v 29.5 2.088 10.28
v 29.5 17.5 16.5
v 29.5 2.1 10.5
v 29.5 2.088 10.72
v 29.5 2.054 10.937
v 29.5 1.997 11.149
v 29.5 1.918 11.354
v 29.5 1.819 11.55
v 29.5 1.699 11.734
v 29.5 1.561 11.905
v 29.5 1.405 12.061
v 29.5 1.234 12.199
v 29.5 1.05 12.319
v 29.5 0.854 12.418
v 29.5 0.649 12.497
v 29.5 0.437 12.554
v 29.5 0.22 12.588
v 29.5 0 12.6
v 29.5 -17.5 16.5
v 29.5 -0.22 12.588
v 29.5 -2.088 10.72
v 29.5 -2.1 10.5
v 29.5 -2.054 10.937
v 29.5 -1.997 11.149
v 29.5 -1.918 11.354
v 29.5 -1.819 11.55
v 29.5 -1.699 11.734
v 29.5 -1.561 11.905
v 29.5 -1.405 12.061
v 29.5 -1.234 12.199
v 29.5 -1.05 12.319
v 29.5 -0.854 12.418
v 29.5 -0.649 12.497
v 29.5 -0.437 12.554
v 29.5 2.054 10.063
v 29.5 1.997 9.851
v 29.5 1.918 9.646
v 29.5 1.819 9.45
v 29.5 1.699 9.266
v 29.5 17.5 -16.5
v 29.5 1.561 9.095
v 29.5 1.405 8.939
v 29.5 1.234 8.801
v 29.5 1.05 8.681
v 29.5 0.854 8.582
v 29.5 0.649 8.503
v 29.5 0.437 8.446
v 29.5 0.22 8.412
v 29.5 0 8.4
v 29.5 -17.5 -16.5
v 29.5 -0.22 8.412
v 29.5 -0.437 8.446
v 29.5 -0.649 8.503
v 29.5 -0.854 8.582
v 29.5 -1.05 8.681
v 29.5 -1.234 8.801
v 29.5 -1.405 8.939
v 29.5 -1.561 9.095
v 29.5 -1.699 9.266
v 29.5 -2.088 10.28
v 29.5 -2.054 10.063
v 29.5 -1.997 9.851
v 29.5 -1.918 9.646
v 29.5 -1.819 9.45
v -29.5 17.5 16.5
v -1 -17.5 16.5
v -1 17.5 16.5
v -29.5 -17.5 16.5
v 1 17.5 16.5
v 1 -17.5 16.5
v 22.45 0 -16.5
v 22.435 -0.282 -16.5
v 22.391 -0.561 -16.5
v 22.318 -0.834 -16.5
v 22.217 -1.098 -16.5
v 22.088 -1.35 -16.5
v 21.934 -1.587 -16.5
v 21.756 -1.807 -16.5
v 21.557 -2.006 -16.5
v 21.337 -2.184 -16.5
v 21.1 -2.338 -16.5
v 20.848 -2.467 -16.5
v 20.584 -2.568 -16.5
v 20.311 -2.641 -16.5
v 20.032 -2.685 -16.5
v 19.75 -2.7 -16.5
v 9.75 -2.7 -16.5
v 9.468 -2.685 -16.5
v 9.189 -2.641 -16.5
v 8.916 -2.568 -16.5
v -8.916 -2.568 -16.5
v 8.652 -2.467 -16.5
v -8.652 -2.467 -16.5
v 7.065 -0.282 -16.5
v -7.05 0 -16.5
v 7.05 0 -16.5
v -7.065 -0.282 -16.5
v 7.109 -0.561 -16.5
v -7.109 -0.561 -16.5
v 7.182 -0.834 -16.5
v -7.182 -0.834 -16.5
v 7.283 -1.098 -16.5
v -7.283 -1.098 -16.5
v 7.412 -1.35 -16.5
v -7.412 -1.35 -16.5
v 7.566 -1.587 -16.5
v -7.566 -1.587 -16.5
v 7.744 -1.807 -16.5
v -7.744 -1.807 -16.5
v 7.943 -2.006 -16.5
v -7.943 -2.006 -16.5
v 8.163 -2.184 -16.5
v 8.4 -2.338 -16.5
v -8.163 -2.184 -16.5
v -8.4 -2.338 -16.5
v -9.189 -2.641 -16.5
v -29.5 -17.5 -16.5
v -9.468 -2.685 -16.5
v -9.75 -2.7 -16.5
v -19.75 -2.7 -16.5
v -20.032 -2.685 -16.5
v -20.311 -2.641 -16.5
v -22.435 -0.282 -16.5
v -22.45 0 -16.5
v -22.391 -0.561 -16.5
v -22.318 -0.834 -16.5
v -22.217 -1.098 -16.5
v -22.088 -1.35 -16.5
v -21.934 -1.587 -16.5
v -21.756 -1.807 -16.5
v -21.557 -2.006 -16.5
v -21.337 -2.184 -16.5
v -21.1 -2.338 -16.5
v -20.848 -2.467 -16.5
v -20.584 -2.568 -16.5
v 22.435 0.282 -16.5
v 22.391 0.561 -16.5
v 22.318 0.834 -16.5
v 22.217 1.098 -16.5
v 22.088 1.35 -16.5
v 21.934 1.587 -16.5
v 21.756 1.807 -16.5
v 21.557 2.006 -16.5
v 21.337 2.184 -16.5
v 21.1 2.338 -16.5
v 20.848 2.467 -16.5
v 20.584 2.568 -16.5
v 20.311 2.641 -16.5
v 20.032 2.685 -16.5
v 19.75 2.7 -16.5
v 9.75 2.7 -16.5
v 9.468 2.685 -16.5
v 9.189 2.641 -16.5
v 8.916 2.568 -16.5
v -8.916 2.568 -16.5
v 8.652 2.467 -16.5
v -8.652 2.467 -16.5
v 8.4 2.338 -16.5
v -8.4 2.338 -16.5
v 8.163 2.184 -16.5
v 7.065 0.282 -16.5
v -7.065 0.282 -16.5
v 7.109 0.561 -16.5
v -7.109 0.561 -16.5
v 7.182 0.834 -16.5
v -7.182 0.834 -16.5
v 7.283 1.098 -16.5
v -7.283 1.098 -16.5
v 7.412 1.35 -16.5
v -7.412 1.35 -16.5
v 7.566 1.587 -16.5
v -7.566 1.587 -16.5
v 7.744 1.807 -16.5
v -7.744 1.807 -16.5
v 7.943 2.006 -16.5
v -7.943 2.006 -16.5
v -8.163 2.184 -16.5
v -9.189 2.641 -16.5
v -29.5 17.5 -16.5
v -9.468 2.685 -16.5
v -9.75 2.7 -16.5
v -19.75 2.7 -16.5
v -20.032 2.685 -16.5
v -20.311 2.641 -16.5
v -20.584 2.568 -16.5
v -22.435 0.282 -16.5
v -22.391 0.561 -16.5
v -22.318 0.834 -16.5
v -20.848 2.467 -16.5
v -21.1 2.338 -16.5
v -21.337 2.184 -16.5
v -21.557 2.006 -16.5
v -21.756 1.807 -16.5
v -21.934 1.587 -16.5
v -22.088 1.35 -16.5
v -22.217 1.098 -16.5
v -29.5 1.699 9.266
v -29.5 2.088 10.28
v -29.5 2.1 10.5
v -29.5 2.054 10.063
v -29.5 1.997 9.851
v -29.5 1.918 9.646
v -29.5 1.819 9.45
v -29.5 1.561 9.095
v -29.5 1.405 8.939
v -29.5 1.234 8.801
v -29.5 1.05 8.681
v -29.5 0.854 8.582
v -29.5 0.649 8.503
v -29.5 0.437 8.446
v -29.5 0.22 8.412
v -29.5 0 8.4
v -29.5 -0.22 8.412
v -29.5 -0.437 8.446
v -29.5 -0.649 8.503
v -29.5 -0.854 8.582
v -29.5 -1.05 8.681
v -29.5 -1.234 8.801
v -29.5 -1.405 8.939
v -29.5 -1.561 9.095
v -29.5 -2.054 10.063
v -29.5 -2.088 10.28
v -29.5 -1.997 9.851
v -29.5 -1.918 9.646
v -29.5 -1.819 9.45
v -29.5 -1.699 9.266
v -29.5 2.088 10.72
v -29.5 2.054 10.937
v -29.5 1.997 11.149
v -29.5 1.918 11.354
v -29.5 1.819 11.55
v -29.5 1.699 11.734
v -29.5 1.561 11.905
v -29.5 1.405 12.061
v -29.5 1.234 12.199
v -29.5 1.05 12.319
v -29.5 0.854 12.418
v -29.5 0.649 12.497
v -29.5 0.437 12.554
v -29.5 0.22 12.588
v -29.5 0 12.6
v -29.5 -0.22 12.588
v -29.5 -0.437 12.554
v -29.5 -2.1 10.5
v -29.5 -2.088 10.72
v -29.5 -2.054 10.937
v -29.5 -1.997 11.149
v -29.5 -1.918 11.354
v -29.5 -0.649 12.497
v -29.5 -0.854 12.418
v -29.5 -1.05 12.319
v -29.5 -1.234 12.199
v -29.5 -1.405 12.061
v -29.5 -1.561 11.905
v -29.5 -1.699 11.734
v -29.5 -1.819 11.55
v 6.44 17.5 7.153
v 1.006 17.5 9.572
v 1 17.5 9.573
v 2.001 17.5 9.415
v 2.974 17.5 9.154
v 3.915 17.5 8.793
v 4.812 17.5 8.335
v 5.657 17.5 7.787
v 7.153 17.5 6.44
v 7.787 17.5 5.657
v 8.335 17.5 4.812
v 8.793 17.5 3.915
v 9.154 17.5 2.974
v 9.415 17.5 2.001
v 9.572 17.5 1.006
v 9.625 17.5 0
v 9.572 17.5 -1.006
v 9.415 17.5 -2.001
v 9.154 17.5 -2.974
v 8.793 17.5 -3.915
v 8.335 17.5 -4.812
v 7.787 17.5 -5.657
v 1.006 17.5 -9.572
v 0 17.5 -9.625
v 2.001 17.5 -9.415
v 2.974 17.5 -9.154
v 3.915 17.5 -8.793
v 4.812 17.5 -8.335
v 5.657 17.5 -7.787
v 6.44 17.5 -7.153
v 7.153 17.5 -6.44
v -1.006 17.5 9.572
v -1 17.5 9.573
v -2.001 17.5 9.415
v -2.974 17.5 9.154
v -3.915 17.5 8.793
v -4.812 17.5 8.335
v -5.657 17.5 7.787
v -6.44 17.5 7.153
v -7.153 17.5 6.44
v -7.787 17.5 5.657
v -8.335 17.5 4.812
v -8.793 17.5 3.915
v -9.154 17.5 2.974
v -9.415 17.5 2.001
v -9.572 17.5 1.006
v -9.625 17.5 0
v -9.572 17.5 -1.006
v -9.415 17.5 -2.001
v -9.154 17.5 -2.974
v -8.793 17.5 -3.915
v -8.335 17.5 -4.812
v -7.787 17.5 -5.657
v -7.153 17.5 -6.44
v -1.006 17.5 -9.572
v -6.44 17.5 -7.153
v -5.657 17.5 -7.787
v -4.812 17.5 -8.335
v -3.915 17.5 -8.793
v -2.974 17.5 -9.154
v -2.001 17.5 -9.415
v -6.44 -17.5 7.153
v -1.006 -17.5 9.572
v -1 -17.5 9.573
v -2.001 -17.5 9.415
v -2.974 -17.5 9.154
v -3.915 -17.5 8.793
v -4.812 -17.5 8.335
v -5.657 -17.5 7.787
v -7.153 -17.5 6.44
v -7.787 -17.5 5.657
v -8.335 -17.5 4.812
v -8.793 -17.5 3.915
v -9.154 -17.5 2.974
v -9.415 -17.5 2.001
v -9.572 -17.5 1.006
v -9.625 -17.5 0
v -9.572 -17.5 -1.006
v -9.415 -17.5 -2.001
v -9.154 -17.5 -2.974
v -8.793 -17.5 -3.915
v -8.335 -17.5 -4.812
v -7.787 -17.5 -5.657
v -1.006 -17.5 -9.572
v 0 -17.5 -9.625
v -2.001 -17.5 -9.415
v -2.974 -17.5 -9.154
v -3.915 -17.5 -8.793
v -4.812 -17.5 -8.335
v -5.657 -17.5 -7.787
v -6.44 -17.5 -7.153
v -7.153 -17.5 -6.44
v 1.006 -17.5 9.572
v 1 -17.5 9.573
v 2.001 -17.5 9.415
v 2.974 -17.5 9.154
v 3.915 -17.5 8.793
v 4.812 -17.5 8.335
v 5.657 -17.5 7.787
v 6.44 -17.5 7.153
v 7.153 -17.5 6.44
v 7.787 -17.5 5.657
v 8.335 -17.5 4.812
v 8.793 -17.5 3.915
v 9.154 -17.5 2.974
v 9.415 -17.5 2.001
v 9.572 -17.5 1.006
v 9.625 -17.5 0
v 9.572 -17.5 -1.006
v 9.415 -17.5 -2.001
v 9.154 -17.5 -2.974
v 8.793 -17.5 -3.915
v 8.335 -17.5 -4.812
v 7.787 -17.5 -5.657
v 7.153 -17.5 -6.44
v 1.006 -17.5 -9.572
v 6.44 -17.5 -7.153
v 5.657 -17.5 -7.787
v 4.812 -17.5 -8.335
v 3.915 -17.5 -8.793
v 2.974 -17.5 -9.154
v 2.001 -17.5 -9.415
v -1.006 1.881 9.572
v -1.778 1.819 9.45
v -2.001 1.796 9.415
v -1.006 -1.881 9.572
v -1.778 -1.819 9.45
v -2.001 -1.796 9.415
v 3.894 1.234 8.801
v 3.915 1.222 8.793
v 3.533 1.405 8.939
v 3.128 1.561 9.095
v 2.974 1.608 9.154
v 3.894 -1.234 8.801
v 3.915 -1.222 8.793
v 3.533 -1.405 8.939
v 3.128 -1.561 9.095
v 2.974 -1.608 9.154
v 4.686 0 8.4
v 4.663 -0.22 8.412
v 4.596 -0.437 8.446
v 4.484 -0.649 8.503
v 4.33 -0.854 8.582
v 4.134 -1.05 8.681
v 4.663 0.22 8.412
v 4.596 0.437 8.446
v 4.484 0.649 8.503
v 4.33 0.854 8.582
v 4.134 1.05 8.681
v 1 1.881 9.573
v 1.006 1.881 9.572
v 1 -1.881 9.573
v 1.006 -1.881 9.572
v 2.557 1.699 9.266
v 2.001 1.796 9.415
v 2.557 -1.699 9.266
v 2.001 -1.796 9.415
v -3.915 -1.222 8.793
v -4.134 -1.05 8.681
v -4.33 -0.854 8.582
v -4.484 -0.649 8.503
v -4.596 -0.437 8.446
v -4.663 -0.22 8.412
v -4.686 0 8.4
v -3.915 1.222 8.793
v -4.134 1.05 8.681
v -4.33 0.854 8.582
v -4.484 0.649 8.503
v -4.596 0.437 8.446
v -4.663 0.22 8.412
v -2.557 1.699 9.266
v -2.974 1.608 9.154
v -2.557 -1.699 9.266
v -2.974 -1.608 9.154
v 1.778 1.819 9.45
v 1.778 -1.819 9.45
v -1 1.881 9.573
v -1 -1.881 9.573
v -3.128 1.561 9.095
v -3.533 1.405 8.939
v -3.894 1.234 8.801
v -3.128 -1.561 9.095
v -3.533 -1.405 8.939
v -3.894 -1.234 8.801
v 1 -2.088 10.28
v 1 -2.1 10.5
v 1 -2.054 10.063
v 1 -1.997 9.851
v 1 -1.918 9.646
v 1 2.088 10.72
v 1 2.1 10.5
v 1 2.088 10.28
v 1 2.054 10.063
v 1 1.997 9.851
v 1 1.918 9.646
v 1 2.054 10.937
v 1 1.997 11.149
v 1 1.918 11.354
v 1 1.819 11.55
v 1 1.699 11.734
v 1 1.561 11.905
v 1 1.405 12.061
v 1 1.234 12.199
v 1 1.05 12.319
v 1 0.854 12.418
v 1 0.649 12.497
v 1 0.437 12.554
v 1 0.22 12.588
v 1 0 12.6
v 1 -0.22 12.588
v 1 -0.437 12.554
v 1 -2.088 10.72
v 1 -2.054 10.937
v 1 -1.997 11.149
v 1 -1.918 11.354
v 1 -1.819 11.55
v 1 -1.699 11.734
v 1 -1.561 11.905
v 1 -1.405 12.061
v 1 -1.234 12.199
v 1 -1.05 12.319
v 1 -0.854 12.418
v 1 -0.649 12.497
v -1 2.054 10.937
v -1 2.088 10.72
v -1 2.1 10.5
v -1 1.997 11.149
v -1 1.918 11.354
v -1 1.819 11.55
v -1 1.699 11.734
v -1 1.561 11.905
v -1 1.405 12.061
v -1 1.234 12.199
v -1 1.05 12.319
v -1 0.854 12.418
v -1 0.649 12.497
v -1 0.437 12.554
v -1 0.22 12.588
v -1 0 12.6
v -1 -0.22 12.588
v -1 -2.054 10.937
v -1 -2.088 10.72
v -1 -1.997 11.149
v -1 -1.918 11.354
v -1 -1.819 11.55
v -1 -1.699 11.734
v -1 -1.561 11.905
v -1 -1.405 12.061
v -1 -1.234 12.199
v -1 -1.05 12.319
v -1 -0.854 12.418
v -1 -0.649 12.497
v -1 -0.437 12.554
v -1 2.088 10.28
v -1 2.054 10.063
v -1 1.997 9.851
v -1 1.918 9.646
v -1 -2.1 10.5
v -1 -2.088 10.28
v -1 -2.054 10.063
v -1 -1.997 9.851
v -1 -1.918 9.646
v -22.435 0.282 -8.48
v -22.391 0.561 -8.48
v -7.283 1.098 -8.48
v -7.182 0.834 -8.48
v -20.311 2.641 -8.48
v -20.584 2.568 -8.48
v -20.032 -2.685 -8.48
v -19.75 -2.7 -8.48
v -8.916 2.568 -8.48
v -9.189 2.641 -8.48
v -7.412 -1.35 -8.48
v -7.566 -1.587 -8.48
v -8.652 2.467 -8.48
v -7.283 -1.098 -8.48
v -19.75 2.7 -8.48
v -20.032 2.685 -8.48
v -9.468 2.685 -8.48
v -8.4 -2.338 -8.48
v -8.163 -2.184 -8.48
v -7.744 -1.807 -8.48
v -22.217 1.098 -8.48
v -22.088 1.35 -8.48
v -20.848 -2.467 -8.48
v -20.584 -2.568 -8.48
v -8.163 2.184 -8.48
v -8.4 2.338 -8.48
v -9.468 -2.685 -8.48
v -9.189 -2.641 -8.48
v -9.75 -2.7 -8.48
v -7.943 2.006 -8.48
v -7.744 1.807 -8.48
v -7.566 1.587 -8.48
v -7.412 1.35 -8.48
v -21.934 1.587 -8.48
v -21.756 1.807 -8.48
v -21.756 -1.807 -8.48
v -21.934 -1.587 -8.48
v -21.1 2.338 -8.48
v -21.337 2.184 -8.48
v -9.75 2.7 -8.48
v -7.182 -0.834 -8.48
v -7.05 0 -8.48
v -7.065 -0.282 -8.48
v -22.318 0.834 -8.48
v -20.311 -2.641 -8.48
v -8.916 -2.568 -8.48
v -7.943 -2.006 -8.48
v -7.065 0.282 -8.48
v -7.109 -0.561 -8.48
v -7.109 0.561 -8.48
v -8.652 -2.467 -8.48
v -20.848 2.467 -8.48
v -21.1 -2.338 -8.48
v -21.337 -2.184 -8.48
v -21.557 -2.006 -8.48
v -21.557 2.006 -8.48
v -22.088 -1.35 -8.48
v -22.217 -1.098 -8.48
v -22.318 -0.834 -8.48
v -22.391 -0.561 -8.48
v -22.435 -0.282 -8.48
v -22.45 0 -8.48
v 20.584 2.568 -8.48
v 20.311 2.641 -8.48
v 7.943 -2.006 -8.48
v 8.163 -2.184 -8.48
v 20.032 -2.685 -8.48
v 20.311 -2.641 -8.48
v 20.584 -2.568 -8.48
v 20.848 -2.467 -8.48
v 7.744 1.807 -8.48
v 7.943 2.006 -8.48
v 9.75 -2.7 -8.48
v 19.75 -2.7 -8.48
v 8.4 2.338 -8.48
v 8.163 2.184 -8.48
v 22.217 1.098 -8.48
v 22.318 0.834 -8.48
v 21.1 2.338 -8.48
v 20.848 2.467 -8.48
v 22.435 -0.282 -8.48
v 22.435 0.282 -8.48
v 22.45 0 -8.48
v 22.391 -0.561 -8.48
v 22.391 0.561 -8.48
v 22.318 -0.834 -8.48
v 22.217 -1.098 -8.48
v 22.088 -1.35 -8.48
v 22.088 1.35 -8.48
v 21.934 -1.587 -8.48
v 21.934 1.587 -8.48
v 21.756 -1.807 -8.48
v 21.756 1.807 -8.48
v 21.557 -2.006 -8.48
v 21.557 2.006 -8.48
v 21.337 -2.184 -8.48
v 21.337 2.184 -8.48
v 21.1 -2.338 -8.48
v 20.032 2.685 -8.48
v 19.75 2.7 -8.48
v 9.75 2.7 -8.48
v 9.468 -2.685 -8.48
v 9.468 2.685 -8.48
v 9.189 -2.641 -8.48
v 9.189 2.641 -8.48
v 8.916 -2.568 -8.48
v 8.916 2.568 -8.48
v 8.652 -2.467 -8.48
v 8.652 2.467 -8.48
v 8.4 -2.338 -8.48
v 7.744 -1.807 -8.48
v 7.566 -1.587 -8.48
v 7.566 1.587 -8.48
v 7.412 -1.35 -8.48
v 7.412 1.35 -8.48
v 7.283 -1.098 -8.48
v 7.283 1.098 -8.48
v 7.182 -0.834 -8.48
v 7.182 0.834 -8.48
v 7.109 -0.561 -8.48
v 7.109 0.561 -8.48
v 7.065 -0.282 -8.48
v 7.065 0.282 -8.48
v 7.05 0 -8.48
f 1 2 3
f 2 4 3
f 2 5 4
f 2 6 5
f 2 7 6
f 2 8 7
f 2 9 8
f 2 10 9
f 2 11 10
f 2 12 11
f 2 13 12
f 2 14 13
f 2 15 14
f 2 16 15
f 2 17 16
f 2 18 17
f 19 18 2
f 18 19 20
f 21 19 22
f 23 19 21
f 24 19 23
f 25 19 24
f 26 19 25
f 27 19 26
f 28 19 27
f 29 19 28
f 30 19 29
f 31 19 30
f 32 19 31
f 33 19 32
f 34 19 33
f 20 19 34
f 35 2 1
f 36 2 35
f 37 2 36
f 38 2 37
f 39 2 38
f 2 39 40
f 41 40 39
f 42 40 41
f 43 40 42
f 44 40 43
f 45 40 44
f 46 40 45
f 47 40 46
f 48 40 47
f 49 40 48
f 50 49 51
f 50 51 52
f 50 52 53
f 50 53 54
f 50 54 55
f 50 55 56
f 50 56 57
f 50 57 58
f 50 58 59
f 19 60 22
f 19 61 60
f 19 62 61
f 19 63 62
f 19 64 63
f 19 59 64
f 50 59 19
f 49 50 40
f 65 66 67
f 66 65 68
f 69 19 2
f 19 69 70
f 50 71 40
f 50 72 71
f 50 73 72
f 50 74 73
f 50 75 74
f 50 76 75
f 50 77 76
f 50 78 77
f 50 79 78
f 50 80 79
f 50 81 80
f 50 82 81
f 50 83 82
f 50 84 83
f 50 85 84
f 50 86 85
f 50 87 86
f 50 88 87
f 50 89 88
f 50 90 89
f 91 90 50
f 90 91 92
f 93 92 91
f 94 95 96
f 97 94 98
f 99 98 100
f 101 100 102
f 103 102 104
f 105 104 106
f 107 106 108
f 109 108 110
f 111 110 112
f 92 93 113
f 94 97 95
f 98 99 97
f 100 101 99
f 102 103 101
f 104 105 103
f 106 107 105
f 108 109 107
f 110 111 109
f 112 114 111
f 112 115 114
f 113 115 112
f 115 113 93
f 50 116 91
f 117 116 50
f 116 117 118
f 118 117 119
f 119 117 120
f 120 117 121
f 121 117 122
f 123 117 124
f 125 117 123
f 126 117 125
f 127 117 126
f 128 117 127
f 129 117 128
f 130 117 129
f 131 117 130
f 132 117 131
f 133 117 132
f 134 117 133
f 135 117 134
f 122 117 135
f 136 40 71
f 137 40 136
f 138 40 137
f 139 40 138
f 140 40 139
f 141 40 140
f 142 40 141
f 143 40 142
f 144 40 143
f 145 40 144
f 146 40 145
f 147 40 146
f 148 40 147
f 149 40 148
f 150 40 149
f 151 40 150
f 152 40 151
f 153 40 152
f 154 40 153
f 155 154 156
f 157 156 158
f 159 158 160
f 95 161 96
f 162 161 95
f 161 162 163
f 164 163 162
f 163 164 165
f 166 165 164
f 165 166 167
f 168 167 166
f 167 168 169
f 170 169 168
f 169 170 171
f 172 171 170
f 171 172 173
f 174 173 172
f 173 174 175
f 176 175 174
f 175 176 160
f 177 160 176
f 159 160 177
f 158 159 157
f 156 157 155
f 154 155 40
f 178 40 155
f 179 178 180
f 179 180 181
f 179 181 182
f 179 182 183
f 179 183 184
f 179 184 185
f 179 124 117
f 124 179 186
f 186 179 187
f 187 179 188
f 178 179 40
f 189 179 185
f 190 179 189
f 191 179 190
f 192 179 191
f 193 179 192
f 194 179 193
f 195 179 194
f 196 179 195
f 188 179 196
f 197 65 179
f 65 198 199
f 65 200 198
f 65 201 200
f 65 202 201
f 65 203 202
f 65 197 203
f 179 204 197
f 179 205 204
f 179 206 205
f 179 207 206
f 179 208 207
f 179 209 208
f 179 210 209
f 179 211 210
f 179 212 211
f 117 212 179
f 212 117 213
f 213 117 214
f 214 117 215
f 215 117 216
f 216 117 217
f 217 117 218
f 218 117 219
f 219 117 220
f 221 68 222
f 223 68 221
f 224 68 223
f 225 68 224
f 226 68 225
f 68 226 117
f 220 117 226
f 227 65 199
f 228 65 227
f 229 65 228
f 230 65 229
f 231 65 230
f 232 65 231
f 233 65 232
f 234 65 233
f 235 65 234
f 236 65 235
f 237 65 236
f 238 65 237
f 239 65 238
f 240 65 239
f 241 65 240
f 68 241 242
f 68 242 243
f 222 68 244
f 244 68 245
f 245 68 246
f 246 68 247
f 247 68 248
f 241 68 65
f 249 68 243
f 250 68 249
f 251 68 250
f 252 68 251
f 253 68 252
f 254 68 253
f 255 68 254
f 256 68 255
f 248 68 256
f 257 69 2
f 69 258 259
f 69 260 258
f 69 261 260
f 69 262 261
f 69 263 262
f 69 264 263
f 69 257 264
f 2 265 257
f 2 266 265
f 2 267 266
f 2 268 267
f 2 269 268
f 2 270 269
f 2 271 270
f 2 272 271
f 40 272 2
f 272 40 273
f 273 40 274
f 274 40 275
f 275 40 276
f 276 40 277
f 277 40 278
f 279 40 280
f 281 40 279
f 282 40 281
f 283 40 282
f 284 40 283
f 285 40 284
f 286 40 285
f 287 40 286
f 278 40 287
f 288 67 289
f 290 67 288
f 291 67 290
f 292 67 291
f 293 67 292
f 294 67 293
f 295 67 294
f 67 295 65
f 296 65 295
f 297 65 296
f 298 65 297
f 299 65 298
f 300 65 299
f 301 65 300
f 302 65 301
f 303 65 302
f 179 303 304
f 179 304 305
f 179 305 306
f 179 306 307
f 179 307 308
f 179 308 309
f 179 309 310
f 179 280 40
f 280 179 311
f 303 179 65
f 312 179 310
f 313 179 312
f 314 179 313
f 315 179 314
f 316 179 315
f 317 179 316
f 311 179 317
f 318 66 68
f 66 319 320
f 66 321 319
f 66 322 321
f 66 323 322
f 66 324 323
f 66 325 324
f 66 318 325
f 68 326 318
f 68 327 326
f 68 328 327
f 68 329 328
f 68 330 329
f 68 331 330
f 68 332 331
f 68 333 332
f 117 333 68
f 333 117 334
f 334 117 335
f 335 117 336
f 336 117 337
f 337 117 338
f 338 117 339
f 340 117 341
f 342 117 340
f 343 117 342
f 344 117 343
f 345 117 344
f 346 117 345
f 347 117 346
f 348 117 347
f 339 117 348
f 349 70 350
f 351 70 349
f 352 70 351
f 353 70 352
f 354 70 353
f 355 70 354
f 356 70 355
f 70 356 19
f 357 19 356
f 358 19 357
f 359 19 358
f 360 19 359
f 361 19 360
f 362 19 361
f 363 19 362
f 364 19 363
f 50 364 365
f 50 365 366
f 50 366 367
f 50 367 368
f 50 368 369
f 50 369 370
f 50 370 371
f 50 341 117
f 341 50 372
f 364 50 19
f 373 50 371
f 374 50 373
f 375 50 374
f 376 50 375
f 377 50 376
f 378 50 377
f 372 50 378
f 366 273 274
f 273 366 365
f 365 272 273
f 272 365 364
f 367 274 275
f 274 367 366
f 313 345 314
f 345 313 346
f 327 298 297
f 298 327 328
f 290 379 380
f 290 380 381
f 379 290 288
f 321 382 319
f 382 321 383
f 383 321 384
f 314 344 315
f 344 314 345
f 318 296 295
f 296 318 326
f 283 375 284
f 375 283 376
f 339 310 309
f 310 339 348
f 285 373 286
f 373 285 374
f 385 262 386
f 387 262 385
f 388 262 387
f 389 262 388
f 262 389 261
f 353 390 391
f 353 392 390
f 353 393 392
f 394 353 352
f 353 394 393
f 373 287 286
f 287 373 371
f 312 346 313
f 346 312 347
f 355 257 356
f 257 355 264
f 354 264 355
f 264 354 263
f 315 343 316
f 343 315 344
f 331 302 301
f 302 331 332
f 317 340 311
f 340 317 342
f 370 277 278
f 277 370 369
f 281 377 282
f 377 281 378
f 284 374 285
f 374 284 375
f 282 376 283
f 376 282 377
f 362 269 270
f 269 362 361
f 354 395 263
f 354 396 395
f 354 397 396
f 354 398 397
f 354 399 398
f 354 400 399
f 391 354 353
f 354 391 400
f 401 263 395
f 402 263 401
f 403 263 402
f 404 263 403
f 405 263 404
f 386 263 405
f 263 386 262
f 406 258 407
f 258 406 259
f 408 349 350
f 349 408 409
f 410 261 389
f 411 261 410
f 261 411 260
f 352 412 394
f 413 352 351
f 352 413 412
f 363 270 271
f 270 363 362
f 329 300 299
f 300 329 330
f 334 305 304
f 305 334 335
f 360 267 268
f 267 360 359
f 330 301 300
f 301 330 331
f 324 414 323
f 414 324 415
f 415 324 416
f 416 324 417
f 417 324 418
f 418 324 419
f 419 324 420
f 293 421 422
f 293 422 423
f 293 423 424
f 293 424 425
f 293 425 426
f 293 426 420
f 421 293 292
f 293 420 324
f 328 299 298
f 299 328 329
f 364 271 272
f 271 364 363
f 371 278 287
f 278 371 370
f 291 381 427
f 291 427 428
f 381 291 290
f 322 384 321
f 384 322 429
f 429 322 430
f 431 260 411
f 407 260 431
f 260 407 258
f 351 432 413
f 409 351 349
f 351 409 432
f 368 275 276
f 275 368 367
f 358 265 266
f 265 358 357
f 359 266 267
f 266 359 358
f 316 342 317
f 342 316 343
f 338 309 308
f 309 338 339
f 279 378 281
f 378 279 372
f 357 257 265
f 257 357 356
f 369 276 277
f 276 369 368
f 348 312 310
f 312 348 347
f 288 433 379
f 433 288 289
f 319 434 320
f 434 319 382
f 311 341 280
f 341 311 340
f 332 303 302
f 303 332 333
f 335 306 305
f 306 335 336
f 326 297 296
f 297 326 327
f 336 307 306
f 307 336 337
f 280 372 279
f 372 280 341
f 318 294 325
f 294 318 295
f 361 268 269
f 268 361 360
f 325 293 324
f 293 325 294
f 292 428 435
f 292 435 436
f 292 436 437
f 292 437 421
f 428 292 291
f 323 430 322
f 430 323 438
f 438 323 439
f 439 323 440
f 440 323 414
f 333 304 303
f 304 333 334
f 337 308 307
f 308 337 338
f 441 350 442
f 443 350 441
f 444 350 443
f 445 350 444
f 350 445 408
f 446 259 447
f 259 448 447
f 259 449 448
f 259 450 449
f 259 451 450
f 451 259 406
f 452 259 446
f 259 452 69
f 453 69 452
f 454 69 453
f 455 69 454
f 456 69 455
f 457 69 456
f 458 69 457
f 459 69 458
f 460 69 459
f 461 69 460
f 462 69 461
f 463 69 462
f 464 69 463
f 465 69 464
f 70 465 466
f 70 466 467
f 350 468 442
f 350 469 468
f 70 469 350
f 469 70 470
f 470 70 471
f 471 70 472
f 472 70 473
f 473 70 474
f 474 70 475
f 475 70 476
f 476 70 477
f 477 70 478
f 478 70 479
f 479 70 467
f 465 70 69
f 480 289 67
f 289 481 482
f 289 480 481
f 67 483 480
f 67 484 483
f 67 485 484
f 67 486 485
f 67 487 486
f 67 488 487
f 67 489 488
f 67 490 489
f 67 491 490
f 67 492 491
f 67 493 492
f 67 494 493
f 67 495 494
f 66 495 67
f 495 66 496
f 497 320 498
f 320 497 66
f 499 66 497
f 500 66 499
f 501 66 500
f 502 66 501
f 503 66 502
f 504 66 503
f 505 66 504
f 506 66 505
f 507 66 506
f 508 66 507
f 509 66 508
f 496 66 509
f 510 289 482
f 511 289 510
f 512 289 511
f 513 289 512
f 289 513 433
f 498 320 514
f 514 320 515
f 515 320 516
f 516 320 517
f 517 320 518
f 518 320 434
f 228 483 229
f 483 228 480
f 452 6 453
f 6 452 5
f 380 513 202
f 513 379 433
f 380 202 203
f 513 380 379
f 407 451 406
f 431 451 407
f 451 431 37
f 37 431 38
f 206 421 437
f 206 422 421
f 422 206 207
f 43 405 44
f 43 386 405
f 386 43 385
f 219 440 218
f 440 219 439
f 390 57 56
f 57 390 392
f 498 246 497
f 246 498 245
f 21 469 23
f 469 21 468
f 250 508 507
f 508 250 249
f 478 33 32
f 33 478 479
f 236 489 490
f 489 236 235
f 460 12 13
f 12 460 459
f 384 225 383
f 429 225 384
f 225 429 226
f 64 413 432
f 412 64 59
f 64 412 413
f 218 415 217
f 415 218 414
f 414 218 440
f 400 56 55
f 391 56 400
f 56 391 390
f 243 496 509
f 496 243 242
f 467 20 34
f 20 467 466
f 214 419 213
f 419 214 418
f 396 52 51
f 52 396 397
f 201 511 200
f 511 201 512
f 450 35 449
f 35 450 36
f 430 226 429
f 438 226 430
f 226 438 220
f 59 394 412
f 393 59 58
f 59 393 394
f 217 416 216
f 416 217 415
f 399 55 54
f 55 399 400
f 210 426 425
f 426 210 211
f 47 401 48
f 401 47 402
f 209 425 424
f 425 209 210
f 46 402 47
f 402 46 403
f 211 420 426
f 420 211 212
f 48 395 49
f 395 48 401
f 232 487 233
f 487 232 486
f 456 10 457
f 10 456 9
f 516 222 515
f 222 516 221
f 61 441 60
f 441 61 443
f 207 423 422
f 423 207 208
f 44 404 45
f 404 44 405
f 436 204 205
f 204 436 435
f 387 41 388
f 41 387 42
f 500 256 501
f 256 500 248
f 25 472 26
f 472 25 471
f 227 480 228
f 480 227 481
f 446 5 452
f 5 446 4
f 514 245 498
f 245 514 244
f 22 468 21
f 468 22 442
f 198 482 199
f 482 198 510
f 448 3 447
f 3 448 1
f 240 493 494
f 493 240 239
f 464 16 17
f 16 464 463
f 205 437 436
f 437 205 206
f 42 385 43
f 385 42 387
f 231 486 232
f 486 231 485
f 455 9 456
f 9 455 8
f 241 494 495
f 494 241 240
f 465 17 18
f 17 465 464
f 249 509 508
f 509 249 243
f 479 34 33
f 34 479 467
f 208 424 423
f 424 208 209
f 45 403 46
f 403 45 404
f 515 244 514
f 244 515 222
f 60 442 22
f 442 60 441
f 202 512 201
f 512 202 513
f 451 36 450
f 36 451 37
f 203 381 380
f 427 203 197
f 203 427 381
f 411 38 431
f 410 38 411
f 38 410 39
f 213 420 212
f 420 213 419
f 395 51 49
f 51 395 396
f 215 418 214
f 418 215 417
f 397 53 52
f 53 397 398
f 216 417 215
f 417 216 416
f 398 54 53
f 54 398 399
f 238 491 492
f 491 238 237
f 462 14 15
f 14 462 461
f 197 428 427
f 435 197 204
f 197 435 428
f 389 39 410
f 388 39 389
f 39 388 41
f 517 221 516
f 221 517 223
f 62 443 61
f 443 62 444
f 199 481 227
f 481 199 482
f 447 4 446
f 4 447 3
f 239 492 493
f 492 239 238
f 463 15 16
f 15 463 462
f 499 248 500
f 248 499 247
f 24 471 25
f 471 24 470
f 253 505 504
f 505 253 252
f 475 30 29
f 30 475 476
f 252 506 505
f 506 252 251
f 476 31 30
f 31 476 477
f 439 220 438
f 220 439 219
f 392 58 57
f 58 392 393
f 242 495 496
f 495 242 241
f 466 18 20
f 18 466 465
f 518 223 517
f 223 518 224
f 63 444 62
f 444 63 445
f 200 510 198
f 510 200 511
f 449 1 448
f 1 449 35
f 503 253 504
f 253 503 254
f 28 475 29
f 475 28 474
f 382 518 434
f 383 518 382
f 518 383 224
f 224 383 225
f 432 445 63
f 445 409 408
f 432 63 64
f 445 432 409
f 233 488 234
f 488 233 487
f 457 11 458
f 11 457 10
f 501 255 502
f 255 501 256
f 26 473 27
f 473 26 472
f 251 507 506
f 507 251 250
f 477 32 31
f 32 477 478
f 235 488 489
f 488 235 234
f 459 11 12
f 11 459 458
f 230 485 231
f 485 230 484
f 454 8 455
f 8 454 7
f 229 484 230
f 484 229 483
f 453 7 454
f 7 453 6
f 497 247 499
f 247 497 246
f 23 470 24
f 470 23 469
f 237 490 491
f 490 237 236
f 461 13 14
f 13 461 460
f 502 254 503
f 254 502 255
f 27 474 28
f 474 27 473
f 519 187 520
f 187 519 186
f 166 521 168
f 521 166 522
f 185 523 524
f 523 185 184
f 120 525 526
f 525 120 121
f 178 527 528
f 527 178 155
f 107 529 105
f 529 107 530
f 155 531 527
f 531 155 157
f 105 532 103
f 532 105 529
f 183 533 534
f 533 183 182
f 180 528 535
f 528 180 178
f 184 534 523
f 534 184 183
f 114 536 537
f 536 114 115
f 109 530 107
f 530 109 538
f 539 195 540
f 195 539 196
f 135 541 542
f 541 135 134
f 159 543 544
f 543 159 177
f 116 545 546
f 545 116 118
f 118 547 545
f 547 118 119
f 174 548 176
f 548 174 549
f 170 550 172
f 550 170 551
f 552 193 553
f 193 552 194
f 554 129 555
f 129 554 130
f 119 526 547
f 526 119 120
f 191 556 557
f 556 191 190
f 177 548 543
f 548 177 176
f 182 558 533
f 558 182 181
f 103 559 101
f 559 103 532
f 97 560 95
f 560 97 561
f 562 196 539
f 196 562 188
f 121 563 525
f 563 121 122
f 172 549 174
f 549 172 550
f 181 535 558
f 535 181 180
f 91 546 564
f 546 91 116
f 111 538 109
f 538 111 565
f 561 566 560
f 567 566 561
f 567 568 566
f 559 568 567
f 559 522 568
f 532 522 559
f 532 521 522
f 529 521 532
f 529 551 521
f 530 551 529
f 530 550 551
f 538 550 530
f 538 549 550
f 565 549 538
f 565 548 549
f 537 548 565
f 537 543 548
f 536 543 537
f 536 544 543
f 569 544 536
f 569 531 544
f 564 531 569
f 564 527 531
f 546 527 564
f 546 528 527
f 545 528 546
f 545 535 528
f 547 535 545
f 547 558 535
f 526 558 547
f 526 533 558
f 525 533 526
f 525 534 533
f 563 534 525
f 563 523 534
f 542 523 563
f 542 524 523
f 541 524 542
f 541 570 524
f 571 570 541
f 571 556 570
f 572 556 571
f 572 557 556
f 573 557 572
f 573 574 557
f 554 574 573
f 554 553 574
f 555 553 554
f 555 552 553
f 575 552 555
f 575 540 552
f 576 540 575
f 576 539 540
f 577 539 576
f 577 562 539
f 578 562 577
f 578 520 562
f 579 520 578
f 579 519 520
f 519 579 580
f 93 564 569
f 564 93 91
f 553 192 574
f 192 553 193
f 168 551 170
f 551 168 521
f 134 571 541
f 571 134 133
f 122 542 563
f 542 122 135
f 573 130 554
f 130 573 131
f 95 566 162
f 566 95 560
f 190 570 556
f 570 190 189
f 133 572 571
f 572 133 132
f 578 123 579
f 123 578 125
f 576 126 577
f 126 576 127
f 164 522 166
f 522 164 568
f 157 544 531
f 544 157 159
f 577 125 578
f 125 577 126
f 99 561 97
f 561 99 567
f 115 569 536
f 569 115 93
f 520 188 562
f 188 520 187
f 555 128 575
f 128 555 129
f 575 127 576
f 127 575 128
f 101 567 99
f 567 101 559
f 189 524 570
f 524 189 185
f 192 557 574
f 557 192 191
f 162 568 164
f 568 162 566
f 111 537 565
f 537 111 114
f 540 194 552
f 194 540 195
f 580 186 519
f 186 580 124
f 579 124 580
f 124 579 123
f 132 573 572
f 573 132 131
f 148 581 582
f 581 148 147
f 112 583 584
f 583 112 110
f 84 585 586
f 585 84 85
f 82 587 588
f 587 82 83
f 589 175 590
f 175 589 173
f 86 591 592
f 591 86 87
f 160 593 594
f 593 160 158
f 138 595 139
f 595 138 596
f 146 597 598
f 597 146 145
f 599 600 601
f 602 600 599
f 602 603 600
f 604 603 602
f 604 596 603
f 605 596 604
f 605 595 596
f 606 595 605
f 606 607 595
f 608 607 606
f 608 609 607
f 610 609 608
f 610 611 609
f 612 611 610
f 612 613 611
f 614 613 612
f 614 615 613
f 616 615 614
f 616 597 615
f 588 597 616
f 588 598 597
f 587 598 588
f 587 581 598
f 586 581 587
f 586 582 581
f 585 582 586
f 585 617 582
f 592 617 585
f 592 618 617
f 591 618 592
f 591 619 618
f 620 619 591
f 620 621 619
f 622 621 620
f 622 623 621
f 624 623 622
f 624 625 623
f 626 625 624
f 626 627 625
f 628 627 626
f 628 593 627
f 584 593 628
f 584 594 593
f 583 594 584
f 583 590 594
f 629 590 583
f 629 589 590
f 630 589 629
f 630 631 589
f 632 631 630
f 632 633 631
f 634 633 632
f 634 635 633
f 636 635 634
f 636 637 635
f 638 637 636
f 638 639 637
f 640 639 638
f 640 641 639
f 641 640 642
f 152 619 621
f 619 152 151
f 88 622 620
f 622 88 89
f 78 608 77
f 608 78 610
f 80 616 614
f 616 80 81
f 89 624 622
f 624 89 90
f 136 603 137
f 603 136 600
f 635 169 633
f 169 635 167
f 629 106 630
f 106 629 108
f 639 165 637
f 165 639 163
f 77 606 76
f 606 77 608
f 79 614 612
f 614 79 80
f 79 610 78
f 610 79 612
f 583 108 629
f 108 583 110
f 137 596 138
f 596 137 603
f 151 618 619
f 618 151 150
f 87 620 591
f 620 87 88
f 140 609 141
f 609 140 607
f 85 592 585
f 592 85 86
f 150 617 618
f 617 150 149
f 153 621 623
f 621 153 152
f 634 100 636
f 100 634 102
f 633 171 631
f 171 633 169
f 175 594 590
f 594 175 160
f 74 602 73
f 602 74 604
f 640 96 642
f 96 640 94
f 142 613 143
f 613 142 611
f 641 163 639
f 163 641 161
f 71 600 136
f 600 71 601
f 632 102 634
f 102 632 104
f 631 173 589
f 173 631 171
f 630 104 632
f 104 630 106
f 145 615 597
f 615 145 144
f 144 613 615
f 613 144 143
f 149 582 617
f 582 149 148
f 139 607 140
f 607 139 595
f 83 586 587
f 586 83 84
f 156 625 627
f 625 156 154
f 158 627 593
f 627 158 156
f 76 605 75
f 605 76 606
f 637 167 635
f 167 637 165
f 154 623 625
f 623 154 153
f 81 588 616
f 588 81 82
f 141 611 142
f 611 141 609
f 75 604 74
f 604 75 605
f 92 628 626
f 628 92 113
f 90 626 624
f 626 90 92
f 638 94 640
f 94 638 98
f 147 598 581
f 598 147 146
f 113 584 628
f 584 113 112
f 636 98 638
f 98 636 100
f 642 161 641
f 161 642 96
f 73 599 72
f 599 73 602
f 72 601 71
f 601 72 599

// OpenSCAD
// Split housing for 19 mm OD linear bearing.
$fn = 60;
eps = 0.02;
bearing_d = 19;
body_l = 59;
body_d = 35;
body_h = 33;
slot_w = 2;
module mount_slot(x) {
    hull() {
        translate([x - 5, 0, -body_h / 2 - eps]) cylinder(d = 5.4, h = 8 + 2 * eps);
        translate([x + 5, 0, -body_h / 2 - eps]) cylinder(d = 5.4, h = 8 + 2 * eps);
    }
}
difference() {
    cube([body_l, body_d, body_h], center = true);
    translate([0, -body_d / 2 - eps, 0]) rotate([-90, 0, 0]) cylinder(d = bearing_d + 0.25, h = body_d + 2 * eps);
    translate([-slot_w / 2, -body_d / 2 - eps, 0]) cube([slot_w, body_d + 2 * eps, body_h / 2 + eps]);
    translate([-body_l / 2 - eps, 0, body_h / 2 - 6]) rotate([0, 90, 0]) cylinder(d = 4.2, h = body_l + 2 * eps);
    mount_slot(-body_l / 4);
    mount_slot(body_l / 4);
}
